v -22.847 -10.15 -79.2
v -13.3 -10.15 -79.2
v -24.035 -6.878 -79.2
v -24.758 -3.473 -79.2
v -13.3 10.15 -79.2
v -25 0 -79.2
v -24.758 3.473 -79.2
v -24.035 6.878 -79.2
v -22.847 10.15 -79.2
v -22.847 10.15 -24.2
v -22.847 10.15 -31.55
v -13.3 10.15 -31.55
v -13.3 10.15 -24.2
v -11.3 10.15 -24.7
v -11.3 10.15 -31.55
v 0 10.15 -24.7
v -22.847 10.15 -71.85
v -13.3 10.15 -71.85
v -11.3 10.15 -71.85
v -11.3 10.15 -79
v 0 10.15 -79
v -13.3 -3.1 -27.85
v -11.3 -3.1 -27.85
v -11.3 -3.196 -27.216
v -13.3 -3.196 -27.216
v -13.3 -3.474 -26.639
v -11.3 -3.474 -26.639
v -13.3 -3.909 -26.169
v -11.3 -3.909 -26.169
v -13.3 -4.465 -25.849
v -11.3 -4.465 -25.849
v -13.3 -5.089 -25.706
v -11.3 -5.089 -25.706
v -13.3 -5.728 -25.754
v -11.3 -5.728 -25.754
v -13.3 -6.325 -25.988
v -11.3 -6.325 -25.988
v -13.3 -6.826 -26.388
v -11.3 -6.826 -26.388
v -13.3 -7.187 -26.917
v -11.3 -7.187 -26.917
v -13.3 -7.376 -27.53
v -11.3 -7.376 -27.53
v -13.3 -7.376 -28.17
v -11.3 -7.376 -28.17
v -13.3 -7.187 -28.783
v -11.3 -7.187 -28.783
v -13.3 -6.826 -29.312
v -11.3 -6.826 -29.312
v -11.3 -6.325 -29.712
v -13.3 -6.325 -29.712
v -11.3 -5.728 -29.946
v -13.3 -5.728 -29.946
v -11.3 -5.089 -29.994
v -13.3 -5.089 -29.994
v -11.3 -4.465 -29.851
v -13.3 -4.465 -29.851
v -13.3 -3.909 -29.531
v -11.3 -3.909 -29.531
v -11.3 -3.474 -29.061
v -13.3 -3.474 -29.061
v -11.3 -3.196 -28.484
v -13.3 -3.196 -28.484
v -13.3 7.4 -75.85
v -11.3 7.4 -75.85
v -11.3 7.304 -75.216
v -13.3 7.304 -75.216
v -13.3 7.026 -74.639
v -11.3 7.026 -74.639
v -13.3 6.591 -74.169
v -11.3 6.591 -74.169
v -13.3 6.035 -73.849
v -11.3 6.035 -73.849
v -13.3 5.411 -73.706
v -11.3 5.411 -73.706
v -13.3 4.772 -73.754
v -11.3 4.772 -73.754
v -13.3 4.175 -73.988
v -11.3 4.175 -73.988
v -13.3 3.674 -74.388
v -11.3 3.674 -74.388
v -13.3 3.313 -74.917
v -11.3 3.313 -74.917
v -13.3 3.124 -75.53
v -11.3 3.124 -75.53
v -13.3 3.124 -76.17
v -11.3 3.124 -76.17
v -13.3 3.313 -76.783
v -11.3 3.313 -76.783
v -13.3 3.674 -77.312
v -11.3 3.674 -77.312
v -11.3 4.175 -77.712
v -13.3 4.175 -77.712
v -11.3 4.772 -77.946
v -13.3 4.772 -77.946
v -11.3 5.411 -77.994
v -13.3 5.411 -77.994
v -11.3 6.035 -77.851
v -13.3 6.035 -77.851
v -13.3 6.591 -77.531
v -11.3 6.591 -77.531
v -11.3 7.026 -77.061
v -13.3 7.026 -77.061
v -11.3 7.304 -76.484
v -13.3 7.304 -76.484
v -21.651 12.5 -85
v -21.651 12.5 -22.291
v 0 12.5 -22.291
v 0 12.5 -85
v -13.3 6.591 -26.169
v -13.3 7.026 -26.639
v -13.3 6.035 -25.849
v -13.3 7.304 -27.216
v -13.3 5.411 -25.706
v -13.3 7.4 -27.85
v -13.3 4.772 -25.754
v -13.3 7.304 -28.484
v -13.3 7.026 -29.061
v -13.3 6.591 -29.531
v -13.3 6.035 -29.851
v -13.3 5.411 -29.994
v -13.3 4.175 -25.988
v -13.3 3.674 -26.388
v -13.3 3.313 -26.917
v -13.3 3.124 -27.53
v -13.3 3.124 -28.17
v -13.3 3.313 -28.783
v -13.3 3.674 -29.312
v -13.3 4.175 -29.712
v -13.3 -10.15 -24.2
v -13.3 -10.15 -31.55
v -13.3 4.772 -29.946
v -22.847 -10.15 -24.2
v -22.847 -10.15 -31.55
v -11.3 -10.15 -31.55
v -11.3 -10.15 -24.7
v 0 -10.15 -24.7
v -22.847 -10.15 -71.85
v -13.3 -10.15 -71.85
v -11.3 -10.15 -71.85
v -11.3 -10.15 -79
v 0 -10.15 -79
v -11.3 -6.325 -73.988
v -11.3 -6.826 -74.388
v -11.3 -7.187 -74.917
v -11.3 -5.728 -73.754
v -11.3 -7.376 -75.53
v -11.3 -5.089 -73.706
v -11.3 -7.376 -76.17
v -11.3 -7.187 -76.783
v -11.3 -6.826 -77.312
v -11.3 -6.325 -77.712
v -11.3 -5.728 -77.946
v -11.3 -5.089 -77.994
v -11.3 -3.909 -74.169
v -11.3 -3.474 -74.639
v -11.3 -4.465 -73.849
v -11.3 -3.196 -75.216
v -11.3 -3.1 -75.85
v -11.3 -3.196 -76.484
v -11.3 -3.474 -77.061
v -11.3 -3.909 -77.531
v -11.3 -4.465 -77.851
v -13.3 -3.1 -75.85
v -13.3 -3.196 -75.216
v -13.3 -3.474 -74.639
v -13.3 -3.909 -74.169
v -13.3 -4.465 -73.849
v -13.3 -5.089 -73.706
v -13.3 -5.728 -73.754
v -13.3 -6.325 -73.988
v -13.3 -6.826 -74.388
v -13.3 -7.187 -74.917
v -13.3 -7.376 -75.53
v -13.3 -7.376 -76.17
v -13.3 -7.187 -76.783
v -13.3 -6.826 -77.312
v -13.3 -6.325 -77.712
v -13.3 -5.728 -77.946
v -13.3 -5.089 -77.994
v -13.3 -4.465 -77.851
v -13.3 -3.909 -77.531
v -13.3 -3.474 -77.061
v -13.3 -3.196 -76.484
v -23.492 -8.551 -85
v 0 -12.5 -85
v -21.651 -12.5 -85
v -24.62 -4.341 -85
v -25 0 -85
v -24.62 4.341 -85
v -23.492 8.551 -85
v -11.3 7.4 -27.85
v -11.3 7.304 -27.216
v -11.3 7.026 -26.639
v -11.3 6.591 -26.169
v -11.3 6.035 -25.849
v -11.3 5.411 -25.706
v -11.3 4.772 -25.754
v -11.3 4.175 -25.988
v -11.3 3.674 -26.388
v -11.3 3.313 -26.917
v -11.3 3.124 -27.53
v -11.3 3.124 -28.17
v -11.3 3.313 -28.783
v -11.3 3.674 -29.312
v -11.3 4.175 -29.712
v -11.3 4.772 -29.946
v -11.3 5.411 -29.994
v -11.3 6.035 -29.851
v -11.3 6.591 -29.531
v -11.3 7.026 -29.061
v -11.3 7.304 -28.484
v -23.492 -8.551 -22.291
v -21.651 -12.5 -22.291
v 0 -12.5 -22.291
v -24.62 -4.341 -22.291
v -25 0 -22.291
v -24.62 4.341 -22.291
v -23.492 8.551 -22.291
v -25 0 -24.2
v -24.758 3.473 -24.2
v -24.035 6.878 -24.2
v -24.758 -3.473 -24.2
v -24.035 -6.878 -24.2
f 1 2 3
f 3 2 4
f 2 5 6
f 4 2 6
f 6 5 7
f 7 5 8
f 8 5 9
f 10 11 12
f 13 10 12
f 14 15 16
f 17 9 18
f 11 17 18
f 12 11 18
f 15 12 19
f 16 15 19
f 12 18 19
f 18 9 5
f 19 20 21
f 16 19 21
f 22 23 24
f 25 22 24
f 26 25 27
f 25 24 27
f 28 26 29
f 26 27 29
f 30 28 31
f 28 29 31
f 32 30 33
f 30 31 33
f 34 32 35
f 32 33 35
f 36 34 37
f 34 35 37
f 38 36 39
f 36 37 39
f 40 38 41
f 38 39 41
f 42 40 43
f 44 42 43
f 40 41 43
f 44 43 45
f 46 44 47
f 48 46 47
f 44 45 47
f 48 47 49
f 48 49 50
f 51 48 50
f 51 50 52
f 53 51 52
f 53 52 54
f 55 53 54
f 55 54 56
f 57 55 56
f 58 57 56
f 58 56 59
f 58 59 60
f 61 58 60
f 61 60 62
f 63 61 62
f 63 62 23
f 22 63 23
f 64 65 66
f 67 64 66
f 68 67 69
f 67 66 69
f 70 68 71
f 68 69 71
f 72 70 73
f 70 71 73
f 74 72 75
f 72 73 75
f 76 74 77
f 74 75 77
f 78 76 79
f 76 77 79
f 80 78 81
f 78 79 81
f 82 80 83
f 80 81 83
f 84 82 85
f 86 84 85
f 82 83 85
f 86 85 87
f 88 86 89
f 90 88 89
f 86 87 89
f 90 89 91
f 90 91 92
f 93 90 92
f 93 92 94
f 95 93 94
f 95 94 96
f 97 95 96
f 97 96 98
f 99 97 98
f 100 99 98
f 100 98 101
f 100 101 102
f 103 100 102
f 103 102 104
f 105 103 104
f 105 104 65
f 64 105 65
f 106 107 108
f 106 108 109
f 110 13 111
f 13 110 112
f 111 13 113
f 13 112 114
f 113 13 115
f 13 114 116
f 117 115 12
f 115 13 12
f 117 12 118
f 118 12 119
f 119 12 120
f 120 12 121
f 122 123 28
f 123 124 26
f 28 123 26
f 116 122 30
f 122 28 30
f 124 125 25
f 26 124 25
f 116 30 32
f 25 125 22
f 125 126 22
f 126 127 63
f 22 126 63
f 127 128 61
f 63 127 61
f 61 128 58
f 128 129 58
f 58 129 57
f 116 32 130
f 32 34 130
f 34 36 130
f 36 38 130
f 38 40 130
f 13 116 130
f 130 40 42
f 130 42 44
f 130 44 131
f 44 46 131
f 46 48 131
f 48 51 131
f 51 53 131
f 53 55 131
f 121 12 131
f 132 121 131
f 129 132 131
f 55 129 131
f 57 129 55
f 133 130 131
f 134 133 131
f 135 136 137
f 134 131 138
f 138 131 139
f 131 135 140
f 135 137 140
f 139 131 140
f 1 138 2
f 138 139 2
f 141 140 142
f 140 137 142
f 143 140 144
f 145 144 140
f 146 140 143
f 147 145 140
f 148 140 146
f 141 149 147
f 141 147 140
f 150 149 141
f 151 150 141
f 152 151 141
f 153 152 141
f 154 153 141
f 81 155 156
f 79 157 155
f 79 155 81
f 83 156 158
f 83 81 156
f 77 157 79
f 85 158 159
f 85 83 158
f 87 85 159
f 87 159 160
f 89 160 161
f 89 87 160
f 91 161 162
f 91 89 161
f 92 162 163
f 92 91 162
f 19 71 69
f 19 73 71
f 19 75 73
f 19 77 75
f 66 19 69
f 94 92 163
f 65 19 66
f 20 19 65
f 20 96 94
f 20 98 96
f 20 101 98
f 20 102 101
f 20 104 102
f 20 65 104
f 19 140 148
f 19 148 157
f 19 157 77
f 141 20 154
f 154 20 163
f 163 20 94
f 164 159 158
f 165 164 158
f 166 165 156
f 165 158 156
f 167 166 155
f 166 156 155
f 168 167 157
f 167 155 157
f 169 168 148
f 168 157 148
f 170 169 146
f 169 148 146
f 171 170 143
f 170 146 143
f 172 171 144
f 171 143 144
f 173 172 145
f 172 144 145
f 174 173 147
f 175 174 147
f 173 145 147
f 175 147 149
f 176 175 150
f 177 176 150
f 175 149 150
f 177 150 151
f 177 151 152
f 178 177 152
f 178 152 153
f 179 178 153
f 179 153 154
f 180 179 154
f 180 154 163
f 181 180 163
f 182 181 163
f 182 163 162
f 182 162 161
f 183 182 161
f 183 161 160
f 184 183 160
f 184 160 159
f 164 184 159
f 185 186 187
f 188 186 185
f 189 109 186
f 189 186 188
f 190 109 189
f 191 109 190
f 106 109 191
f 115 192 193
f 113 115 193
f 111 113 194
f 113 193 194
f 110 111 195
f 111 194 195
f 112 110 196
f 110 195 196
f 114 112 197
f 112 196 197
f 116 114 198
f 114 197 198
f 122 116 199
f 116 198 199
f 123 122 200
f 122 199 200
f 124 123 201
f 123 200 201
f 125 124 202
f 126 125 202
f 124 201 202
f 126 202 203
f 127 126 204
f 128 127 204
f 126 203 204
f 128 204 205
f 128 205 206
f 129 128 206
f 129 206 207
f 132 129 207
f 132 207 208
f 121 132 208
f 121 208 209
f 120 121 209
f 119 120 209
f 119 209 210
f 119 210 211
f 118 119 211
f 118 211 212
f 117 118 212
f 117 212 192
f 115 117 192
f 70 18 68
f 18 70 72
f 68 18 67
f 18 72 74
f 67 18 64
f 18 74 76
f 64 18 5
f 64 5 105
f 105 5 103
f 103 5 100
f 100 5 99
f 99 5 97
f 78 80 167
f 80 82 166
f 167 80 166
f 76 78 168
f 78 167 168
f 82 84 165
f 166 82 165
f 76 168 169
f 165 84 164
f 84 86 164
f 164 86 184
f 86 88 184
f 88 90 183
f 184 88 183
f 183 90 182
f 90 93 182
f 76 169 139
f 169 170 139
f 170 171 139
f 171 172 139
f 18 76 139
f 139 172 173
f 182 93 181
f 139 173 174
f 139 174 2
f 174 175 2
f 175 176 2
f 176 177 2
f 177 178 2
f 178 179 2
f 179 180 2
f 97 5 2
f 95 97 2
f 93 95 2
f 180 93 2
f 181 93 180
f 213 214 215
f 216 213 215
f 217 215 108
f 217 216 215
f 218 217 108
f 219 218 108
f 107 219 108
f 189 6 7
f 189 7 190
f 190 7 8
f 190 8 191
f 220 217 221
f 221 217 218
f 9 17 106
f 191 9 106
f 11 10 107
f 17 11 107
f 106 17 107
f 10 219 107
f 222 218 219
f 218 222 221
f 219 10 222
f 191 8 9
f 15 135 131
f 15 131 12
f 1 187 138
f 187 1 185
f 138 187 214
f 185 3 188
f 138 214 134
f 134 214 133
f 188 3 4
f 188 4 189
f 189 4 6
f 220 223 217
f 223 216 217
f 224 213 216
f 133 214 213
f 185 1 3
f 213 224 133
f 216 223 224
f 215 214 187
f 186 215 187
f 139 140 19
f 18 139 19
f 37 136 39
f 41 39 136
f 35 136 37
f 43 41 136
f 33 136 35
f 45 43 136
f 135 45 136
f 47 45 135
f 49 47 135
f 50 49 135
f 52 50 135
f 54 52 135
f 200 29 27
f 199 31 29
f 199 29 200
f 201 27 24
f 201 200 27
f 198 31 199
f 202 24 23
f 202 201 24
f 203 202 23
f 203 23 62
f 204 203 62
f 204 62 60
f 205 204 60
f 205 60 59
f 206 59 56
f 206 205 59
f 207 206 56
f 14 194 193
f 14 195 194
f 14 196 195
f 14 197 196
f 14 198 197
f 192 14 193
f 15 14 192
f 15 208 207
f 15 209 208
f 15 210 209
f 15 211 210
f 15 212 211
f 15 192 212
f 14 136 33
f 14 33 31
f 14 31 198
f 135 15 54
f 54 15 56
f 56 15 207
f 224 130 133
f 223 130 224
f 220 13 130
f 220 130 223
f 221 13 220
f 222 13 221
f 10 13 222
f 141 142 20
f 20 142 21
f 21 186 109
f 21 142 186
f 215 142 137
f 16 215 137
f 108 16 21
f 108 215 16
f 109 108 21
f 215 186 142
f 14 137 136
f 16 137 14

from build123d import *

# Parameters (mm, degrees)
SKETCH1_R               = 25
SKETCH1_W               = 27.5
SKETCH1_H               = 27.5
BOSS_EXTRUDE1_DEPTH     = 55
BOSS_EXTRUDE2_START     = 5
SKETCH2_R               = 25
BOSS_EXTRUDE2_DEPTH     = 5
SKETCH3_W               = 25
SKETCH3_H               = 50
BOSS_EXTRUDE3_DEPTH     = 80
FILLET1_R               = 2.5
FILLET2_R               = 2.5
SKETCH21_W              = 54.3
SKETCH21_H              = 20.3
CUT_EXTRUDE1_DEPTH      = 11.3
SKETCH22_W              = 40.3
SKETCH22_H              = 20.3
CUT_EXTRUDE2_DEPTH      = 93.059763198
CUT_EXTRUDE3_DEPTH      = 88.464278423
SKETCH23_R              = 2.15
CUT_EXTRUDE4_DEPTH      = 93.059763198
CUT_EXTRUDE7_DEPTH      = 27.5
CUT_EXTRUDE8_DEPTH      = 93.059763198
CUT_EXTRUDE8_DEPTH_BACK = 93.059763198
SKETCH25_W              = 77.291444149
SKETCH25_H              = 50
CUT_EXTRUDE9_DEPTH      = 93.059763198
CUT_EXTRUDE9_DEPTH_BACK = 93.059763198
SKETCH26_W              = 62.708555851
SKETCH26_H              = 12.5


with BuildPart() as part:
    # Sketch1 → Boss-Extrude1 (new body)
    with BuildSketch(Plane.XY):
        Circle(SKETCH1_R)
        Rectangle(SKETCH1_W, SKETCH1_H, mode=Mode.SUBTRACT)
    extrude(amount=BOSS_EXTRUDE1_DEPTH)

    # Sketch2 → Boss-Extrude2 (add)
    with BuildSketch(Plane(origin=(0, 0, 0), x_dir=(-1, 0, 0), z_dir=(0, 0, -1)).offset(BOSS_EXTRUDE2_START)):
        Circle(SKETCH2_R)
    extrude(amount=-BOSS_EXTRUDE2_DEPTH)

    # Sketch3 → Boss-Extrude3 (add)
    with BuildSketch(Plane(origin=(0, 0, -5), x_dir=(-1, 0, 0), z_dir=(0, 0, -1))):
        with Locations((12.5, 0)):
            Rectangle(SKETCH3_W, SKETCH3_H)
    extrude(amount=BOSS_EXTRUDE3_DEPTH)

    # Fillet1
    fillet1_edges = [part.edges().sort_by_distance(p)[0] for p in [
        (-13.75, 13.75, 27.5),
        (13.75, 13.75, 27.5),
        (-13.75, -13.75, 27.5),
        (13.75, -13.75, 27.5),
    ]]
    fillet(fillet1_edges, radius=FILLET1_R)

    # Fillet2
    fillet2_edges = [part.edges().sort_by_distance(p)[0] for p in [
        (13.75, 0, 55),
    ]]
    fillet(fillet2_edges, radius=FILLET2_R)

    # Sketch21 → Cut-Extrude1 (cut)
    with BuildSketch(Plane(origin=(0, 0, 0), x_dir=(0, 0, -1), z_dir=(1, 0, 0))):
        with Locations((51.85, 0)):
            Rectangle(SKETCH21_W, SKETCH21_H)
    extrude(amount=-CUT_EXTRUDE1_DEPTH, mode=Mode.SUBTRACT)

    # Sketch22 → Cut-Extrude2 (cut, through all)
    with BuildSketch(Plane(origin=(0, 0, 0), x_dir=(0, 0, -1), z_dir=(1, 0, 0))):
        with Locations((51.7, 0)):
            Rectangle(SKETCH22_W, SKETCH22_H)
    extrude(amount=-CUT_EXTRUDE2_DEPTH, mode=Mode.SUBTRACT)

    # Sketch18 → Cut-Extrude3 (cut, through all)
    with BuildSketch(Plane.XY.offset(-5)):
        with BuildLine():
            Line((-25, -25), (0, -25))
            ThreePointArc((0, -25), (-17.67766953, -17.67766953), (-25, 0))
            Line((-25, 0), (-25, -25))
        make_face()
        with BuildLine():
            Line((-25, 25), (-25, 0))
            ThreePointArc((-25, 0), (-17.67766953, 17.67766953), (0, 25))
            Line((0, 25), (-25, 25))
        make_face()
    extrude(amount=-CUT_EXTRUDE3_DEPTH, mode=Mode.SUBTRACT)

    # Sketch23 → Cut-Extrude4 (cut, through all)
    with BuildSketch(Plane(origin=(0, 0, 0), x_dir=(0, 0, -1), z_dir=(1, 0, 0))):
        with Locations((75.85, 5.25)):
            Circle(SKETCH23_R)
        with Locations((75.85, -5.25)):
            Circle(SKETCH23_R)
        with Locations((27.85, 5.25)):
            Circle(SKETCH23_R)
        with Locations((27.85, -5.25)):
            Circle(SKETCH23_R)
    extrude(amount=-CUT_EXTRUDE4_DEPTH, mode=Mode.SUBTRACT)

    # Sketch24 → Cut-Extrude7 (cut, symmetric)
    with BuildSketch(Plane(origin=(0, 0, -51.7), x_dir=(-1, 0, 0), z_dir=(0, 0, -1))):
        with BuildLine():
            Line((13.3, 10.15), (13.3, -10.15))
            Line((13.3, -10.15), (22.846826913, -10.15))
            ThreePointArc((22.846826913, -10.15), (25, 0), (22.846826913, 10.15))
            Line((22.846826913, 10.15), (13.3, 10.15))
        make_face()
    extrude(amount=CUT_EXTRUDE7_DEPTH, both=True, mode=Mode.SUBTRACT)

    # Sketch25 → Cut-Extrude8 (cut, two sides: drawn at the far end of the back side and taken through both)
    with BuildSketch(Plane(origin=(0, 0, 0), x_dir=(0, 0, -1), z_dir=(1, 0, 0)).offset(-CUT_EXTRUDE8_DEPTH_BACK)):
        with Locations((-16.354277925, 0)):
            Rectangle(SKETCH25_W, SKETCH25_H)
    extrude(amount=CUT_EXTRUDE8_DEPTH + CUT_EXTRUDE8_DEPTH_BACK, mode=Mode.SUBTRACT)

    # Sketch26 → Cut-Extrude9 (cut, two sides: drawn at the far end of the back side and taken through both)
    with BuildSketch(Plane(origin=(0, 0, 0), x_dir=(0, 0, -1), z_dir=(1, 0, 0)).offset(-CUT_EXTRUDE9_DEPTH_BACK)):
        with Locations((53.645722075, 18.75)):
            Rectangle(SKETCH26_W, SKETCH26_H)
        with Locations((53.645722075, -18.75)):
            Rectangle(SKETCH26_W, SKETCH26_H)
    extrude(amount=CUT_EXTRUDE9_DEPTH + CUT_EXTRUDE9_DEPTH_BACK, mode=Mode.SUBTRACT)


solid = part.part
